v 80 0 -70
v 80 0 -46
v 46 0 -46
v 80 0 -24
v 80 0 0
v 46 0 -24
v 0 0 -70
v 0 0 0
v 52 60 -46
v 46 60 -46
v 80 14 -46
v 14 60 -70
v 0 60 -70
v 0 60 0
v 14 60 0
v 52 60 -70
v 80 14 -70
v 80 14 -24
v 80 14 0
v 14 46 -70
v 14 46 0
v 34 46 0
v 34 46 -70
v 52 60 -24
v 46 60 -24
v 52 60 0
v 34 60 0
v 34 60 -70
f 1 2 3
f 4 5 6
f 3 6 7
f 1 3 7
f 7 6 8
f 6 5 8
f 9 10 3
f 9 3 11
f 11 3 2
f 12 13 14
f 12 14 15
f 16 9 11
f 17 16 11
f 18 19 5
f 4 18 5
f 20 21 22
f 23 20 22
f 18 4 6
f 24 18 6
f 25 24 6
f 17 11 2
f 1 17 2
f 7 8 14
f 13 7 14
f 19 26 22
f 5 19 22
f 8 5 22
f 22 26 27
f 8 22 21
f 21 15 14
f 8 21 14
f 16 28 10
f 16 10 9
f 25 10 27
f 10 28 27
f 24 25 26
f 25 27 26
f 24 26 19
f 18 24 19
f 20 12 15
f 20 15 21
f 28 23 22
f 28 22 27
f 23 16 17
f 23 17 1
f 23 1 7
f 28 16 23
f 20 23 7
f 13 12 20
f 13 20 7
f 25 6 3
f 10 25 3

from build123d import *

# Parameters (mm, degrees)
Y_KSEKLIK_EKSTR_ZYON1_DEPTH = 70
IZIM2_OUTSIDE_W             = 106.414
IZIM2_OUTSIDE_H             = 96.414
KES_EKSTR_ZYON3_DEPTH       = 60


with BuildPart() as part:
    # Çizim1 → Yükseklik-Ekstrüzyon1 (new body)
    with BuildSketch(Plane.XY):
        Polygon((0, 0), (0, 60), (14, 60), (14, 46), (34, 46), (34, 60), (52, 60), (80, 14), (80, 0), align=None)
    extrude(amount=-Y_KSEKLIK_EKSTR_ZYON1_DEPTH)

    # Çizim2 outside → Kes-Ekstrüzyon3 (cut)
    with BuildSketch(Plane(origin=(0, 0, 0), x_dir=(1, 0, 0), z_dir=(0, 1, 0))):
        with Locations((40, 35)):
            Rectangle(IZIM2_OUTSIDE_W, IZIM2_OUTSIDE_H)
        Polygon((80, 70), (46, 70), (0, 70), (0, 0), (80, 0), (80, 24), (46, 24), (46, 46), (80, 46), align=None, mode=Mode.SUBTRACT)
    extrude(amount=KES_EKSTR_ZYON3_DEPTH, mode=Mode.SUBTRACT)


solid = part.part
